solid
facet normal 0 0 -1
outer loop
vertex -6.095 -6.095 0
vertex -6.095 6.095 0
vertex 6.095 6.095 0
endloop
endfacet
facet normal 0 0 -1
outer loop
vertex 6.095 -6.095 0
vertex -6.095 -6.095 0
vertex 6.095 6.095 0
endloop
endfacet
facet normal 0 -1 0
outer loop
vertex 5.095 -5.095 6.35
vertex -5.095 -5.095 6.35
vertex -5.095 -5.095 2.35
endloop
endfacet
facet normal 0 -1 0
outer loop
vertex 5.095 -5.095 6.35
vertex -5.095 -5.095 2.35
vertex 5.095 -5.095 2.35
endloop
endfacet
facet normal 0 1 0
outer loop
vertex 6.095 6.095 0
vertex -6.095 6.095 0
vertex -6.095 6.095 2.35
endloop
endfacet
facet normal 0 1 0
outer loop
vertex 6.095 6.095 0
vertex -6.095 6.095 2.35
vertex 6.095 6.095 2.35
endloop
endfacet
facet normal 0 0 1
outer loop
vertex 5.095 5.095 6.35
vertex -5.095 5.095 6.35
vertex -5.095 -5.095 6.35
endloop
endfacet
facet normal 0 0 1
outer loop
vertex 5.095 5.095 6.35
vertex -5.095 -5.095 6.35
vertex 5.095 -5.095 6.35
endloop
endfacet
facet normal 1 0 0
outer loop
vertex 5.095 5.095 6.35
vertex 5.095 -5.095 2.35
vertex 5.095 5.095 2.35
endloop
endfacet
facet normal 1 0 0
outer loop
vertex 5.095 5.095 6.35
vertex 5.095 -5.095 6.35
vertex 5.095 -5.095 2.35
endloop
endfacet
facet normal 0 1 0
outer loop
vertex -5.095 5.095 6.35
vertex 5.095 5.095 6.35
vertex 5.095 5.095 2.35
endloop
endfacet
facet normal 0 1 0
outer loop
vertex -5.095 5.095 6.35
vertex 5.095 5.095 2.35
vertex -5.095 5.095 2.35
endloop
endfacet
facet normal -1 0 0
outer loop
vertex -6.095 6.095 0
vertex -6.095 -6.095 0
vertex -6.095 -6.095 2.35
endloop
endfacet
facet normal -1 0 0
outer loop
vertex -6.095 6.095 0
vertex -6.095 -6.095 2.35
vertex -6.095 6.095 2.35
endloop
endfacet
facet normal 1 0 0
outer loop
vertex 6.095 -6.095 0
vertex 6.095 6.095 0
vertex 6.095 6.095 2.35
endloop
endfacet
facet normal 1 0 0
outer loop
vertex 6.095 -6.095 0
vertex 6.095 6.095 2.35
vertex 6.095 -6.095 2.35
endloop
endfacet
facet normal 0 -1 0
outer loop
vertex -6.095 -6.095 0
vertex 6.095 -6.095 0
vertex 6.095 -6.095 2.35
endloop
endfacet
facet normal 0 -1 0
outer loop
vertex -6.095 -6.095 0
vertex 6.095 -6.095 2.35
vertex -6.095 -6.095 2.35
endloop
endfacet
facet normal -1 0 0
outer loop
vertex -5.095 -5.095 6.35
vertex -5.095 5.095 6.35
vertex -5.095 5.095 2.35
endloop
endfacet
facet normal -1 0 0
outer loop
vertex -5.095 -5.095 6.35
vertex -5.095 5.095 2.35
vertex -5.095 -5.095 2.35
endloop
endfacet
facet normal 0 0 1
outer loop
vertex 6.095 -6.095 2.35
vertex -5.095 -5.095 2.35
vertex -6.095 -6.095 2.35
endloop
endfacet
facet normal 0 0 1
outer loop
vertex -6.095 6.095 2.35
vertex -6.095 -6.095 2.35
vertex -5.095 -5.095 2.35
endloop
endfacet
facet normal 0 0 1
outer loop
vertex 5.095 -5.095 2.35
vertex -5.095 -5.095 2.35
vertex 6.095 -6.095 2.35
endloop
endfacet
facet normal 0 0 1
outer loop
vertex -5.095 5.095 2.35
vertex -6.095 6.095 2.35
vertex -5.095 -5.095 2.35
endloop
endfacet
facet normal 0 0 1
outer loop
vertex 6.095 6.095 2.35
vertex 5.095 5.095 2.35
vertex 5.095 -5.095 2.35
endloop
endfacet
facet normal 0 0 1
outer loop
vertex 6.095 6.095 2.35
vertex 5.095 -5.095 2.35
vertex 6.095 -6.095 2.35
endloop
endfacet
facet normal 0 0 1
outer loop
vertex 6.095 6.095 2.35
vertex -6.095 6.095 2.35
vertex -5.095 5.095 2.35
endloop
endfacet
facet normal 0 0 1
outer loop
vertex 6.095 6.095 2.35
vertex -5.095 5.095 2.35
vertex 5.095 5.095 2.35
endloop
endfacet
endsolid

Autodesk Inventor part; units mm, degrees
ref_plane "YZ Plane" through (0, 0, 0) normal (1, 0, 0) x (0, 1, 0)
ref_plane "XZ Plane" through (0, 0, 0) normal (0, 1, 0) x (-1, 0, 0)
ref_plane "XY Plane" through (0, 0, 0) normal (0, 0, 1) x (1, 0, 0)
sketch "スケッチ1" plane through (0, 0, 0) normal (0, 0, 1) x (1, 0, 0)
  line L0 (-6.095, 6.095) -> (6.095, 6.095)
  line L1 (6.095, 6.095) -> (6.095, -6.095)
  line L2 (6.095, -6.095) -> (-6.095, -6.095)
  line L3 (-6.095, -6.095) -> (-6.095, 6.095)
  line L4 (-6.095, 6.095) -> (6.095, -6.095) construction
  line L5 (6.095, 6.095) -> (-6.095, -6.095) construction
  point P0 (0, 0)
  dimension "d0" = 12.19
  dimension "d1" = 12.19
extrude "押し出し1" add sketch "スケッチ1" along normal blind 6.35
sketch "スケッチ2" plane through (0, 0, 6.35) normal (0, 0, 1) x (1, 0, 0)
  line L0 (6.095, 6.095) -> (-6.095, 6.095) projected
  line L1 (-6.095, -6.095) -> (6.095, -6.095)
  line L2 (6.095, -6.095) -> (6.095, 6.095)
  line L3 (6.095, 6.095) -> (-6.095, 6.095)
  line L4 (-6.095, 6.095) -> (-6.095, -6.095)
  line L5 (-6.095, -6.095) -> (6.095, 6.095) construction
  line L6 (6.095, -6.095) -> (-6.095, 6.095) construction
  line L7 (-5.095, -5.095) -> (5.095, -5.095)
  line L8 (5.095, -5.095) -> (5.095, 5.095)
  line L9 (5.095, 5.095) -> (-5.095, 5.095)
  line L10 (-5.095, 5.095) -> (-5.095, -5.095)
  point P0 (0, 0)
  dimension "d4" = 1
extrude "押し出し2" cut sketch "スケッチ2" against normal blind 4
properties part number "Circuit_DCDCconverter_OKL-T3-W12N-C"
